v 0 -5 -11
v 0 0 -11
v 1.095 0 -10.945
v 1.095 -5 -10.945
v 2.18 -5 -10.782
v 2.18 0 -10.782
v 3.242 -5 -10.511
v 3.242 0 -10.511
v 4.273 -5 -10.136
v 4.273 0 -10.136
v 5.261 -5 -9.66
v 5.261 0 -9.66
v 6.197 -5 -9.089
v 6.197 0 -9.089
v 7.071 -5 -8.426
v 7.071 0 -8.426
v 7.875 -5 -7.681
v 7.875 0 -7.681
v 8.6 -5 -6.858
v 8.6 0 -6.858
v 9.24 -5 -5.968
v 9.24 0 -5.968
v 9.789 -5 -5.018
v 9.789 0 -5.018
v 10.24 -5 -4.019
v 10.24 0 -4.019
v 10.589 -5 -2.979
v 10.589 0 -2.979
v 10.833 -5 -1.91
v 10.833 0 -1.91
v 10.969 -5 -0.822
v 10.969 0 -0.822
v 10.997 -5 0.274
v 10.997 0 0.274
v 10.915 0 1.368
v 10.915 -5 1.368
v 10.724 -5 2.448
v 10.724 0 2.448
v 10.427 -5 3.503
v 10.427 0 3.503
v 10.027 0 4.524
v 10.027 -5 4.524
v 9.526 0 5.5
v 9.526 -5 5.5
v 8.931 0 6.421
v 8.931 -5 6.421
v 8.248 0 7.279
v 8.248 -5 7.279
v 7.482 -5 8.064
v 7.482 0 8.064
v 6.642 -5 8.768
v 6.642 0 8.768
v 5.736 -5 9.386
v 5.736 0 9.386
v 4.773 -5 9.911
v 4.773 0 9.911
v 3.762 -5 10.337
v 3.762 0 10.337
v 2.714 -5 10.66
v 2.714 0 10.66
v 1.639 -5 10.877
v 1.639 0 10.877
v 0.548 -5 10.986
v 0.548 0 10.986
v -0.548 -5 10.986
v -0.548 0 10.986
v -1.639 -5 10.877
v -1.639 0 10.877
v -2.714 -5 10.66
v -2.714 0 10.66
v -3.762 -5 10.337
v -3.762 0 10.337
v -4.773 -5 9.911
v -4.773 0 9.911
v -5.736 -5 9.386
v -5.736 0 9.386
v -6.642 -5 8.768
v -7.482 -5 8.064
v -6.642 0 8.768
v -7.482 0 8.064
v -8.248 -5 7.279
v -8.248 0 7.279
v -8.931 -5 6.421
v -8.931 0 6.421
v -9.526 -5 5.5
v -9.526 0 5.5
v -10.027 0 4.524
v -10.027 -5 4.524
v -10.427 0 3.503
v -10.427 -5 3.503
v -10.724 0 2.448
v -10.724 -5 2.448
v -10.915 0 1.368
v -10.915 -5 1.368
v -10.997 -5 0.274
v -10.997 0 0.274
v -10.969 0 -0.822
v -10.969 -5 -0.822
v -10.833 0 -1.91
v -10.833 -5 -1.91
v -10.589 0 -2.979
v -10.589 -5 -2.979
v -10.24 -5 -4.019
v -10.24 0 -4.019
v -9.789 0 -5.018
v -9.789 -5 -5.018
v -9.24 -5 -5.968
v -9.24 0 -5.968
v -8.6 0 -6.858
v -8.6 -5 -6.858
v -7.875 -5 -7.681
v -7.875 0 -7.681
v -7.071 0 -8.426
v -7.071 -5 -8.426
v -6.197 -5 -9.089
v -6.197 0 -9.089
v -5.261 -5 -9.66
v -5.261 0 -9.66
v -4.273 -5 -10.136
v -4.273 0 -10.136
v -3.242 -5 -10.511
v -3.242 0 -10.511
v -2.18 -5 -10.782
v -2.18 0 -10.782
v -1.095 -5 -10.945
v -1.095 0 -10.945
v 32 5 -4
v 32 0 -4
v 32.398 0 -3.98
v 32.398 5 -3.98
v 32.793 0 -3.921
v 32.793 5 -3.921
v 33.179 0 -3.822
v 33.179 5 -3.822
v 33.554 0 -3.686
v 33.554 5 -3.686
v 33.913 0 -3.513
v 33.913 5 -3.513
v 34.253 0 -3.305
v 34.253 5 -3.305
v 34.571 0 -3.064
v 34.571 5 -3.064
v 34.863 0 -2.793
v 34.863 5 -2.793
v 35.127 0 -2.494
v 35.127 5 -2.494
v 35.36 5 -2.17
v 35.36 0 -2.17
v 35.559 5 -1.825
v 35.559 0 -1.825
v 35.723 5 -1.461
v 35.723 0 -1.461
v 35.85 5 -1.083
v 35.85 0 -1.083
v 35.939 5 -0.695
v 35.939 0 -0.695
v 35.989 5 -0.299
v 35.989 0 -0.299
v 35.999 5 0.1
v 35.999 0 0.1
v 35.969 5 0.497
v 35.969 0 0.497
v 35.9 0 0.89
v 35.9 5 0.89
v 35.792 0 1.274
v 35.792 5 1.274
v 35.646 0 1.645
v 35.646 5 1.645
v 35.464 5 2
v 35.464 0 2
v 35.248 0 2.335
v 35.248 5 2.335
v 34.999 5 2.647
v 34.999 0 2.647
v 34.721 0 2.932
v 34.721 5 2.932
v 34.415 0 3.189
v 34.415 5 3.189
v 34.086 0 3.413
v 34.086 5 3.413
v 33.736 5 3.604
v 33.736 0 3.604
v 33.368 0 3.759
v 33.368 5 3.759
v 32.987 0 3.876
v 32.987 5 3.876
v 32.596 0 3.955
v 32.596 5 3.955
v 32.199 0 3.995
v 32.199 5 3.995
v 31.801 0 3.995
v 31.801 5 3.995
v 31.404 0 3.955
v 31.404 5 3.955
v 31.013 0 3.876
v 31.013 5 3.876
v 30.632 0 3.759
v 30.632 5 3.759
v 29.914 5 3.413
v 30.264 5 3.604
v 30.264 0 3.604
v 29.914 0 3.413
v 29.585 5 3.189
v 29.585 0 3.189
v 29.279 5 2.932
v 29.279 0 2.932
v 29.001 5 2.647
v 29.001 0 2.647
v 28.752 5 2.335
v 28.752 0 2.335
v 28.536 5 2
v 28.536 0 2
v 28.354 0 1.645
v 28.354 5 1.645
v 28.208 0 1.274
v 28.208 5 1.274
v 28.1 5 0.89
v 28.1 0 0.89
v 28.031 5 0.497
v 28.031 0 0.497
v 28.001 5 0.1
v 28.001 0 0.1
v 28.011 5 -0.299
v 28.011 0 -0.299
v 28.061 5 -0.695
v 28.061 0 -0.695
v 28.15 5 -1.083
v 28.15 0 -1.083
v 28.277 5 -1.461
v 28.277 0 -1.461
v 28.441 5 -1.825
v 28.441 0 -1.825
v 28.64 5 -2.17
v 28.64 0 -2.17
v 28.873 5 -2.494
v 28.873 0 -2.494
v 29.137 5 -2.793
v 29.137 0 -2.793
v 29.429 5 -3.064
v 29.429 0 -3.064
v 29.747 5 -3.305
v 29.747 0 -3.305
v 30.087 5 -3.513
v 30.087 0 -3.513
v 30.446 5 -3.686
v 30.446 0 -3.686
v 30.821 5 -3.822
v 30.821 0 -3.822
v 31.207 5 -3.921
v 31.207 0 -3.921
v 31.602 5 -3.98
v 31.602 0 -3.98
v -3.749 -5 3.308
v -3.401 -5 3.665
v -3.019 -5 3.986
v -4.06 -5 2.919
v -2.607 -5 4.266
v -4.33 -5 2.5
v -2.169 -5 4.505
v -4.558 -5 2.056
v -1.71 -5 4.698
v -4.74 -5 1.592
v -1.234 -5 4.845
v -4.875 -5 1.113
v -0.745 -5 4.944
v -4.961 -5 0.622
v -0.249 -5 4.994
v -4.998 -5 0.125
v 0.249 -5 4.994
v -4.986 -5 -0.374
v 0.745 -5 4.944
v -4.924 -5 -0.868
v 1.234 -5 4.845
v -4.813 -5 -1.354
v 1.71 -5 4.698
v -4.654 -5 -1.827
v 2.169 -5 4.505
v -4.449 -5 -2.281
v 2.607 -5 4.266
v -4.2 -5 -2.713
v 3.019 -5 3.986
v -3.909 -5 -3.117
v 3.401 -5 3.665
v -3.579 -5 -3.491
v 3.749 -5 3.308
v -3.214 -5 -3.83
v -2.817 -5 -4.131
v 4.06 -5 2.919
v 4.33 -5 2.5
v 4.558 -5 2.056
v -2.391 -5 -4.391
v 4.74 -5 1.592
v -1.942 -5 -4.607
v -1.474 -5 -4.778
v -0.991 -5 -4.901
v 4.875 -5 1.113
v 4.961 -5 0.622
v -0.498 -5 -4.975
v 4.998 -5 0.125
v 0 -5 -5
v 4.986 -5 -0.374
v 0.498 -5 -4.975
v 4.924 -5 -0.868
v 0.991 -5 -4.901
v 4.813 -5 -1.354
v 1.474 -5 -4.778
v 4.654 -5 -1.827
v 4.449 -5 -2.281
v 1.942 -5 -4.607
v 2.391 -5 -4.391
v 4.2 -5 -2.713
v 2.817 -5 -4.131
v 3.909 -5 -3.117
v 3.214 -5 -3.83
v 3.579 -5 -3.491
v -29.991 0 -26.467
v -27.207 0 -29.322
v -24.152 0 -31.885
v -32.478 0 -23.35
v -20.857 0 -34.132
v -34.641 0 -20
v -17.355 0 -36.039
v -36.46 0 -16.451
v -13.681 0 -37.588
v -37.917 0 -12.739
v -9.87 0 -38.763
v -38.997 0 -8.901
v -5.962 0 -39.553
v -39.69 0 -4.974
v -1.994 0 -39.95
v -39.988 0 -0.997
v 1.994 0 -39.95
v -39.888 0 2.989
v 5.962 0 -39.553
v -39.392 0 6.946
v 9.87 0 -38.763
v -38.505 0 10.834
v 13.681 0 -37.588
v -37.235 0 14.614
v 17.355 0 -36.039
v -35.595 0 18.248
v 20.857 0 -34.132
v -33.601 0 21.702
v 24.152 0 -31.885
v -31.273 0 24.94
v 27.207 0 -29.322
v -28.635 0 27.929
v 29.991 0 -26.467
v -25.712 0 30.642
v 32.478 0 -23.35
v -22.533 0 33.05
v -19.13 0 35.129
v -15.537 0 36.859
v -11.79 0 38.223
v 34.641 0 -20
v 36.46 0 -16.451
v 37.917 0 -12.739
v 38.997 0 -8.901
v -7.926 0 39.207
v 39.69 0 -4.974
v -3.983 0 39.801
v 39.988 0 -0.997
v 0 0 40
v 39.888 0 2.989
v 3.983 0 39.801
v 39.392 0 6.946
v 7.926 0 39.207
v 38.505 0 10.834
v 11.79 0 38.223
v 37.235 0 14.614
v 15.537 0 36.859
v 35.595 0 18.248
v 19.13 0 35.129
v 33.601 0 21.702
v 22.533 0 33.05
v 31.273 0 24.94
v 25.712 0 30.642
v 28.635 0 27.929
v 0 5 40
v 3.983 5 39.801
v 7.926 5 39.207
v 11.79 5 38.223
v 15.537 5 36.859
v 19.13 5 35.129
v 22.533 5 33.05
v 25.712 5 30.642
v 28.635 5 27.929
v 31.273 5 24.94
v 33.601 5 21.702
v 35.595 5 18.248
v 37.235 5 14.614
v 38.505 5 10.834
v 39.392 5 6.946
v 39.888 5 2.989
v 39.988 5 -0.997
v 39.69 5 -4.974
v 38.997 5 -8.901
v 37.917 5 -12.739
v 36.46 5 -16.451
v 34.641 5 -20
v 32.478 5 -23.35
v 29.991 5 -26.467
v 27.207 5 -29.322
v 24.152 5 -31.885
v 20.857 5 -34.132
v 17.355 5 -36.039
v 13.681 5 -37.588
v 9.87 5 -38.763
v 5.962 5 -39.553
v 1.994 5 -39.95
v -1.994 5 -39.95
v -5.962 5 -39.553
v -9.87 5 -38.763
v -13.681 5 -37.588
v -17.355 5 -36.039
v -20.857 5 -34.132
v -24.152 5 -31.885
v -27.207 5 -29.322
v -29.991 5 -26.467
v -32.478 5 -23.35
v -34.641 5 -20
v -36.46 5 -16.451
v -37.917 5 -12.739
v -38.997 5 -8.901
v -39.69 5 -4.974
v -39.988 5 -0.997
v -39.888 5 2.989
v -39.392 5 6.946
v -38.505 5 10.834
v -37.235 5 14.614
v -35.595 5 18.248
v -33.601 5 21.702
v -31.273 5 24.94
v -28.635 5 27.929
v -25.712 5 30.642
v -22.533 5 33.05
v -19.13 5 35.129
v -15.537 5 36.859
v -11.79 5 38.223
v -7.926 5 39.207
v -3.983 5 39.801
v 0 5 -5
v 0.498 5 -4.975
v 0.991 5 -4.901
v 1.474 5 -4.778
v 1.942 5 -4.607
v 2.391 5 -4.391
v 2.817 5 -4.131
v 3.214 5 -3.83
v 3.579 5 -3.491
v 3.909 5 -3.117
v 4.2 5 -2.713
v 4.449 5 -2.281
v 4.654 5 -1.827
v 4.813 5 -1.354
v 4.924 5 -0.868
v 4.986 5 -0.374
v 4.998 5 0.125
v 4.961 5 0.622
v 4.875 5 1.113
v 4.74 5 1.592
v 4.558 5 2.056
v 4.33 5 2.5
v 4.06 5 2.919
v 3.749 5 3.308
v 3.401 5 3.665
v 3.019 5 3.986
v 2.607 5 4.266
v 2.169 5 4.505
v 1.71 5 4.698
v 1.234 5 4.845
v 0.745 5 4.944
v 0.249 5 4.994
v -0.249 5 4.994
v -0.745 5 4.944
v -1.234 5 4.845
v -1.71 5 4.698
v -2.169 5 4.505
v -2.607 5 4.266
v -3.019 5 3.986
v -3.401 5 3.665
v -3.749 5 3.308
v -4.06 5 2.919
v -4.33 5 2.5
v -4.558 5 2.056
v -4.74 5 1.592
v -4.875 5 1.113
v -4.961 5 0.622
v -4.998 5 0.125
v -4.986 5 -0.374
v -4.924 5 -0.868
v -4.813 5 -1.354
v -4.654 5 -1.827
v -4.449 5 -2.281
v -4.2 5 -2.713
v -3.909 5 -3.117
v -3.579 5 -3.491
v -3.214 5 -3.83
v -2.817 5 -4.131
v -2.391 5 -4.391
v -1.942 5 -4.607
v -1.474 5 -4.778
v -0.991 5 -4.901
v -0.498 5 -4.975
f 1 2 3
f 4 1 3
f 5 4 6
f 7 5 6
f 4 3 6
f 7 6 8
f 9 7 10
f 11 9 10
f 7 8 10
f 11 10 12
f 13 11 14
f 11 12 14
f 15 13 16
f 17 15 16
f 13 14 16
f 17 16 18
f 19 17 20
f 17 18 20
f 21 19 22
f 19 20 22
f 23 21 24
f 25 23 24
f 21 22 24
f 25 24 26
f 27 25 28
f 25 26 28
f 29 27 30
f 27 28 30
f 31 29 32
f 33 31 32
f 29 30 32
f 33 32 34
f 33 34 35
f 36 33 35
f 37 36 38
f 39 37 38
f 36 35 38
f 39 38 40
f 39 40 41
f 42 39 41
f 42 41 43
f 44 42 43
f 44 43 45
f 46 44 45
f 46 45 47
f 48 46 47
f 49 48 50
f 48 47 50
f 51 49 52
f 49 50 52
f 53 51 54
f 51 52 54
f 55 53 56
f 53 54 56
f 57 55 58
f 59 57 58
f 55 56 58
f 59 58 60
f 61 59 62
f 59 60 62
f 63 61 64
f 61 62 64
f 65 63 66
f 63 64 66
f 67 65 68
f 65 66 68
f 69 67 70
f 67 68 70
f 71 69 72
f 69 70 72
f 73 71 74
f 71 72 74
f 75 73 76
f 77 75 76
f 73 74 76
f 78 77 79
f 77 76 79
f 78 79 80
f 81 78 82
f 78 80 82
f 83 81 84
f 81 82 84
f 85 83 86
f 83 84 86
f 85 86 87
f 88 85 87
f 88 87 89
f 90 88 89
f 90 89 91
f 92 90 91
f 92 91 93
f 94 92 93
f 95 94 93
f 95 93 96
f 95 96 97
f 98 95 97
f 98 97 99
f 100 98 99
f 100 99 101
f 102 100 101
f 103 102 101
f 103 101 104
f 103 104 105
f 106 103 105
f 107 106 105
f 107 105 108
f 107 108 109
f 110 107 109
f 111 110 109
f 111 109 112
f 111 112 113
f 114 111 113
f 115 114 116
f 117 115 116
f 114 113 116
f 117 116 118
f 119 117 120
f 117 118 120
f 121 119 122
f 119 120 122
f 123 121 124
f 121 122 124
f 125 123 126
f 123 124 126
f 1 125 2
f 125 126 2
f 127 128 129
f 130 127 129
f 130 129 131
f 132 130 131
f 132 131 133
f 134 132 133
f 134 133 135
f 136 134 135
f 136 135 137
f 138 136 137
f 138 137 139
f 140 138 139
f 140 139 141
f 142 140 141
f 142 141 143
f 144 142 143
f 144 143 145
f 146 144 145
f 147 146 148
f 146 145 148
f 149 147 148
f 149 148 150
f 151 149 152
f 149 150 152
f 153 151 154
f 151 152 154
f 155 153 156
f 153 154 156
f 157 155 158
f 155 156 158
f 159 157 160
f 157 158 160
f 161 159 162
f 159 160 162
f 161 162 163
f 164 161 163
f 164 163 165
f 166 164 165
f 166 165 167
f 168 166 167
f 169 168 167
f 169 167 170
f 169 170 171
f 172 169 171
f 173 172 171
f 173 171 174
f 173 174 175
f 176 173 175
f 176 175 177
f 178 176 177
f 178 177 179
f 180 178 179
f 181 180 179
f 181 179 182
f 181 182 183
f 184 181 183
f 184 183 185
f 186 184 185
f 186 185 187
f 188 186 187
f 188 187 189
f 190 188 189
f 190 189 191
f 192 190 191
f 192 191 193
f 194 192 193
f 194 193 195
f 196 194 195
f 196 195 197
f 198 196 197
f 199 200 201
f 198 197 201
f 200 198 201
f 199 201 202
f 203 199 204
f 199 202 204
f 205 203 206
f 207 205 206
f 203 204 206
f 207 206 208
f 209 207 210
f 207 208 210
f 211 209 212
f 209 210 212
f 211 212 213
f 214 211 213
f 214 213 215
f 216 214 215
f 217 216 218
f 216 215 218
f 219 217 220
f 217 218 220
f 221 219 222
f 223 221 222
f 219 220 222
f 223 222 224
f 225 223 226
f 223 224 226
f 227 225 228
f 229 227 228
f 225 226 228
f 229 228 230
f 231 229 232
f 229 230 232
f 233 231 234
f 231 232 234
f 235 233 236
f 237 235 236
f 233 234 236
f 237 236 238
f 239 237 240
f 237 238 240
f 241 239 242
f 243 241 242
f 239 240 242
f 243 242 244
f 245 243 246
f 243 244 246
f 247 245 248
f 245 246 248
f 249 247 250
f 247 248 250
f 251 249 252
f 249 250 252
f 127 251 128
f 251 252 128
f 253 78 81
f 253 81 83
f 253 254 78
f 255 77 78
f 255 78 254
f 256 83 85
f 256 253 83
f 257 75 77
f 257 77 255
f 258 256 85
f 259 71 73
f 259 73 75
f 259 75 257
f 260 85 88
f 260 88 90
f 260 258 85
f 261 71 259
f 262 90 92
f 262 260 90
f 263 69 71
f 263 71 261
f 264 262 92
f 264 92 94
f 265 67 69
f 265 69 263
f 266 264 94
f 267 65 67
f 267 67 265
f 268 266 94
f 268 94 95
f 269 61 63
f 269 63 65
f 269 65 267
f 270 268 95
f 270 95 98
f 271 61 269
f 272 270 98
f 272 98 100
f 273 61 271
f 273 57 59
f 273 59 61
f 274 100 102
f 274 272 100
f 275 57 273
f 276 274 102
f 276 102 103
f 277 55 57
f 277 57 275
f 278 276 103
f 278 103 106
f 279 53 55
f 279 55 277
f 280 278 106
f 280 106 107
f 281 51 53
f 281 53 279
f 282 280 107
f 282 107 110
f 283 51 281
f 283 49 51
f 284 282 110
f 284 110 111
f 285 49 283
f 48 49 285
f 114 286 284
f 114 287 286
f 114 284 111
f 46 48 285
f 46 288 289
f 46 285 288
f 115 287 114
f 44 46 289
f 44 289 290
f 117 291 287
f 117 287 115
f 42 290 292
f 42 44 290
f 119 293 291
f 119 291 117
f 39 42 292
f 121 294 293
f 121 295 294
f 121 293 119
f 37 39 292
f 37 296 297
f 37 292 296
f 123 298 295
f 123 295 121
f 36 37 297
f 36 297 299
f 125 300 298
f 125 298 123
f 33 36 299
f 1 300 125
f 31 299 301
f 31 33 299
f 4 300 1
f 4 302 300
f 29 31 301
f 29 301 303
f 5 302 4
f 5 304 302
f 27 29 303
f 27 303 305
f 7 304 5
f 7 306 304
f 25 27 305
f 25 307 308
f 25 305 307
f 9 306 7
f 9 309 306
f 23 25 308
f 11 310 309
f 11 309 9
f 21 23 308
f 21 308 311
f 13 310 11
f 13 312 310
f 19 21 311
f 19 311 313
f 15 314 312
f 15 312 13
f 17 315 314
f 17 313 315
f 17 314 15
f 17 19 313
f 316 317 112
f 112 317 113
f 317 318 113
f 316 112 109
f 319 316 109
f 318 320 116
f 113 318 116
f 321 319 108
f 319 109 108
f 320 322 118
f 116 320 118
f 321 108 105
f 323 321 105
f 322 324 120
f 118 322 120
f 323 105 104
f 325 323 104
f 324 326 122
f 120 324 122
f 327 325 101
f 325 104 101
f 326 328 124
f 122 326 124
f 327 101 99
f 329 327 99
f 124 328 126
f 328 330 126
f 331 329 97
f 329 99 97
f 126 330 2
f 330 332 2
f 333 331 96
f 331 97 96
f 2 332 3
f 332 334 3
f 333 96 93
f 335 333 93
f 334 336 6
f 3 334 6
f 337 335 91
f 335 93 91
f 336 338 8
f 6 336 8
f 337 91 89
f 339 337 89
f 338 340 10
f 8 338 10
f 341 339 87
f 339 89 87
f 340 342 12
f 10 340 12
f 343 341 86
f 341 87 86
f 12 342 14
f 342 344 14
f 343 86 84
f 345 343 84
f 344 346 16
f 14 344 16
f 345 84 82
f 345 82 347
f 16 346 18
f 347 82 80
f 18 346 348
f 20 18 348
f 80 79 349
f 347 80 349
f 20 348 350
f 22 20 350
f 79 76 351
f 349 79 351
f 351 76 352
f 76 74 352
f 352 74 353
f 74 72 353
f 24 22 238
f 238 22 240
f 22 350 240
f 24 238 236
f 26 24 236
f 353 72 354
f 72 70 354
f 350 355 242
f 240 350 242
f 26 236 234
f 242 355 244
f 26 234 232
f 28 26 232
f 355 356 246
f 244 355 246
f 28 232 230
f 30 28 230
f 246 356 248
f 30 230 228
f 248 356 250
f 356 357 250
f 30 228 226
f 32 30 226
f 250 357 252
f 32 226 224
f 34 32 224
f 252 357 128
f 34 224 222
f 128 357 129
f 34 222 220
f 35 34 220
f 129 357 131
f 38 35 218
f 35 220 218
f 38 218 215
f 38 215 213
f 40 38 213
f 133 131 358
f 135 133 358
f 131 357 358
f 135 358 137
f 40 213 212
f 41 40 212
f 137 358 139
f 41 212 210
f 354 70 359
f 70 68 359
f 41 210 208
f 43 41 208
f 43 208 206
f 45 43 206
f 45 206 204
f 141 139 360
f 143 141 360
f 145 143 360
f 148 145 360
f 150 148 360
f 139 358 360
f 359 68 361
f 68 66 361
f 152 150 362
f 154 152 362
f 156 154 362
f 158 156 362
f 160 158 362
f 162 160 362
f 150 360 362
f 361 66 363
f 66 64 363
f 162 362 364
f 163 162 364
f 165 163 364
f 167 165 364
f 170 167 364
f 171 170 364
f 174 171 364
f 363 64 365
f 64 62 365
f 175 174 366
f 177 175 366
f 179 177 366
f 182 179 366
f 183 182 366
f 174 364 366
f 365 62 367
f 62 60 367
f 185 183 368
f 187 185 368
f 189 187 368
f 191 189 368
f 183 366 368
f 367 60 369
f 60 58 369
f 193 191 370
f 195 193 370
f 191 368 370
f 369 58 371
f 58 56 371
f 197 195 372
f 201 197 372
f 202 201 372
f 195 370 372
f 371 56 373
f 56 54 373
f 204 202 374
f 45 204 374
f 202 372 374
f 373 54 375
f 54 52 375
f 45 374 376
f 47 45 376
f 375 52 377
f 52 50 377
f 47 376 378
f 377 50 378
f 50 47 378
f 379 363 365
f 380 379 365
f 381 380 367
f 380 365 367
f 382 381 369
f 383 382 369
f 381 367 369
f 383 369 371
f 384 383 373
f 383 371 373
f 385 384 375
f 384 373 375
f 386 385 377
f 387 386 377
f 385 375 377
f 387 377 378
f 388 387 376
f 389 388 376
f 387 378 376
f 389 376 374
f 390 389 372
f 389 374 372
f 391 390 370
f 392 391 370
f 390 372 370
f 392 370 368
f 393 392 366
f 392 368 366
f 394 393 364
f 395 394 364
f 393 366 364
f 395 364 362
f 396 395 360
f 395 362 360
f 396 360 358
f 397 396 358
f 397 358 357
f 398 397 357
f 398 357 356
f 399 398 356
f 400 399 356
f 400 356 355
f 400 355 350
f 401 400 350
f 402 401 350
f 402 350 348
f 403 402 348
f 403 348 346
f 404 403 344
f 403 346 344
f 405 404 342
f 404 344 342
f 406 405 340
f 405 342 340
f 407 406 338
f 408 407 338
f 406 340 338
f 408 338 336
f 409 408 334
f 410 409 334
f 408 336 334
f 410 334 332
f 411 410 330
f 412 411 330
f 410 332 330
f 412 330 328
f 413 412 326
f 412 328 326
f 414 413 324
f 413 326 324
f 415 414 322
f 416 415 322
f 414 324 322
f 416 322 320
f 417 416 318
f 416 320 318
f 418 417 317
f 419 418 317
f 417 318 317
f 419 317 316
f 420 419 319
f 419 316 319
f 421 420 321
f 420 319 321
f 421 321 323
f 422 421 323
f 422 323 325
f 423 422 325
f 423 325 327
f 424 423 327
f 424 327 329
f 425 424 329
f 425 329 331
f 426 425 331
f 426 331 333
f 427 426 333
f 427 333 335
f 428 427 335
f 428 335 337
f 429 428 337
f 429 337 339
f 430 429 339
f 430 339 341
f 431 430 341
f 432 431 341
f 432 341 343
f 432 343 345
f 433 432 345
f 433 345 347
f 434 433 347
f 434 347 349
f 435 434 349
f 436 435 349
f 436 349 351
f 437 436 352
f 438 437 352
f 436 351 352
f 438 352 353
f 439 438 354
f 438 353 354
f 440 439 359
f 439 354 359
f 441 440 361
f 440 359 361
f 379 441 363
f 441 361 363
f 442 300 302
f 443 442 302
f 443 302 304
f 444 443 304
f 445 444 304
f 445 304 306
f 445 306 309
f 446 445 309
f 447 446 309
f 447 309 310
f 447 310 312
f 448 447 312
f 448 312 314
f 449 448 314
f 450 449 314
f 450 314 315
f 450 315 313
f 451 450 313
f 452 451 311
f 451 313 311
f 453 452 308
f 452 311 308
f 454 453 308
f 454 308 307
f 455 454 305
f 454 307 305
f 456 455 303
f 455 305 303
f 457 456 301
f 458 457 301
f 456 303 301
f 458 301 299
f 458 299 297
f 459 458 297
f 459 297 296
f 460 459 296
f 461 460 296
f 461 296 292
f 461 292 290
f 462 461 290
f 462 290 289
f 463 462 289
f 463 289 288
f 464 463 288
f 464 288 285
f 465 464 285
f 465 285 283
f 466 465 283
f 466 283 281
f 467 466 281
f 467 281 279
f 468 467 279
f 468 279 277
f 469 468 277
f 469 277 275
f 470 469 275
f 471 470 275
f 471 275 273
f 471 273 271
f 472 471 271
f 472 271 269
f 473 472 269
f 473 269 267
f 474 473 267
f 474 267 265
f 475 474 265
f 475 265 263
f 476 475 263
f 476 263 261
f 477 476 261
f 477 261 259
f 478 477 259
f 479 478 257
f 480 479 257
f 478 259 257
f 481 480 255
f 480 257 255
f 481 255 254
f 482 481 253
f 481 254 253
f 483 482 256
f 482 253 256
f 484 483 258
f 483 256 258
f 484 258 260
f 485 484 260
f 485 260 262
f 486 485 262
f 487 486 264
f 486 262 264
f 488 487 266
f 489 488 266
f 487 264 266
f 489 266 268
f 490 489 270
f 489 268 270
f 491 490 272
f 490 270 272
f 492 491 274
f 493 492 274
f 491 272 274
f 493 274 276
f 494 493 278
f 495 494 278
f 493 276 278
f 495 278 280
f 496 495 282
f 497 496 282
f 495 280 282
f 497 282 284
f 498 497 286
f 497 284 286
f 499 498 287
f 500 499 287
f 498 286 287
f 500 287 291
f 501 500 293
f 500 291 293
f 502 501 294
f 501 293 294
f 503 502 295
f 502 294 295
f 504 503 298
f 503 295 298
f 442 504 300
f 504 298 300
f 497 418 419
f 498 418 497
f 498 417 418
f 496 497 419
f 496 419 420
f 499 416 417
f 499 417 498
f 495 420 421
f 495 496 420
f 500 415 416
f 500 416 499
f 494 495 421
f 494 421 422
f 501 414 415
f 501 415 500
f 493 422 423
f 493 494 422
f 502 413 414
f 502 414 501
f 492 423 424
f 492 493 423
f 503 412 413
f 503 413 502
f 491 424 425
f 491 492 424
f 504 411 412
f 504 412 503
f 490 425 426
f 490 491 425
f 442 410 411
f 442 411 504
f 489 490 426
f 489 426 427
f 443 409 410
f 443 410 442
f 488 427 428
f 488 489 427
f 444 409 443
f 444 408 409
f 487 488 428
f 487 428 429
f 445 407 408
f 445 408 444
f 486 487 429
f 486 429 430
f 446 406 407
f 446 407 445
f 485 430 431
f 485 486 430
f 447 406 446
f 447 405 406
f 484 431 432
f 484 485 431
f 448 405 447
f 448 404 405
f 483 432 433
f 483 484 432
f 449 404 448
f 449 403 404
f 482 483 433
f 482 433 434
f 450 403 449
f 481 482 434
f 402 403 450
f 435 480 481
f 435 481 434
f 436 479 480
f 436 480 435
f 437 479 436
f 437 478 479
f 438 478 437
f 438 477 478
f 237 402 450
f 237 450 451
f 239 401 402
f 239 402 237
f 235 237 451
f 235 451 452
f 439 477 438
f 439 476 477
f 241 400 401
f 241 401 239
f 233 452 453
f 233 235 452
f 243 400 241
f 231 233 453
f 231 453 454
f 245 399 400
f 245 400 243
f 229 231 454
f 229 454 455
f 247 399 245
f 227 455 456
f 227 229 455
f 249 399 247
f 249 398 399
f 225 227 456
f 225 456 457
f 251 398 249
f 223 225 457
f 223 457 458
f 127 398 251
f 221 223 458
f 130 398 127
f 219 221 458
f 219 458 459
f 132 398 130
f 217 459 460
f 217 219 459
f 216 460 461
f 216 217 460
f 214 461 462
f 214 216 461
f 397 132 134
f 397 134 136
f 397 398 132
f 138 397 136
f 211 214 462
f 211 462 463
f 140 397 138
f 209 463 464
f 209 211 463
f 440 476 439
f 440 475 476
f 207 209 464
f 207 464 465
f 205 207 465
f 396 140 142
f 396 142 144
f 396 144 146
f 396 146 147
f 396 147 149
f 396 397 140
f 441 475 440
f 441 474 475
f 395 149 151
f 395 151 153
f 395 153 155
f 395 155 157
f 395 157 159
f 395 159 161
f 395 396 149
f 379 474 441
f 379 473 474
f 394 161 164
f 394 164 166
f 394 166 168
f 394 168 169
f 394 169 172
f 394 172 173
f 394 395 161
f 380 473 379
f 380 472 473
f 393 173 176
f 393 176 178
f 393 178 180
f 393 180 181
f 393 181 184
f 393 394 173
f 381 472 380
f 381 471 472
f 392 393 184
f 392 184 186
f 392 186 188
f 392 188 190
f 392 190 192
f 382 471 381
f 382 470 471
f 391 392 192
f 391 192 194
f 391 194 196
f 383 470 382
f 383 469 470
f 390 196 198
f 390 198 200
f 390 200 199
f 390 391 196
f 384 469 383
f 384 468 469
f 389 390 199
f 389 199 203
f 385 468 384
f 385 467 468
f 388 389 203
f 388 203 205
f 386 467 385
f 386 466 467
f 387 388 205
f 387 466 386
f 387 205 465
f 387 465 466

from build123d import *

# Parameters (mm, degrees)
SKETCH1_R           = 40
BOSS_EXTRUDE1_DEPTH = 5
SKETCH2_R           = 11
BOSS_EXTRUDE2_DEPTH = 5
SKETCH3_R           = 5
CUT_EXTRUDE1_DEPTH  = 58.445626465
SKETCH4_R           = 4
CUT_EXTRUDE2_DEPTH  = 57.789083458


with BuildPart() as part:
    # Sketch1 → Boss-Extrude1 (new body)
    with BuildSketch(Plane(origin=(0, 0, 0), x_dir=(1, 0, 0), z_dir=(0, 1, 0))):
        with Locations(Location((0, 0, 0), (0, 0, 270))):
            Circle(SKETCH1_R)
    extrude(amount=BOSS_EXTRUDE1_DEPTH)

    # Sketch2 → Boss-Extrude2 (add)
    with BuildSketch(Plane.XZ):
        with Locations(Location((0, 0, 0), (0, 0, 270))):
            Circle(SKETCH2_R)
    extrude(amount=BOSS_EXTRUDE2_DEPTH)

    # Sketch3 → Cut-Extrude1 (cut, through all)
    with BuildSketch(Plane.XZ.offset(5)):
        with Locations(Location((0, 0, 0), (0, 0, 270))):
            Circle(SKETCH3_R)
    extrude(amount=-CUT_EXTRUDE1_DEPTH, mode=Mode.SUBTRACT)

    # Sketch4 → Cut-Extrude2 (cut, through all)
    with BuildSketch(Plane.XZ):
        with Locations(Location((32, 0, 0), (0, 0, 270))):
            Circle(SKETCH4_R)
    extrude(amount=-CUT_EXTRUDE2_DEPTH, mode=Mode.SUBTRACT)


solid = part.part
